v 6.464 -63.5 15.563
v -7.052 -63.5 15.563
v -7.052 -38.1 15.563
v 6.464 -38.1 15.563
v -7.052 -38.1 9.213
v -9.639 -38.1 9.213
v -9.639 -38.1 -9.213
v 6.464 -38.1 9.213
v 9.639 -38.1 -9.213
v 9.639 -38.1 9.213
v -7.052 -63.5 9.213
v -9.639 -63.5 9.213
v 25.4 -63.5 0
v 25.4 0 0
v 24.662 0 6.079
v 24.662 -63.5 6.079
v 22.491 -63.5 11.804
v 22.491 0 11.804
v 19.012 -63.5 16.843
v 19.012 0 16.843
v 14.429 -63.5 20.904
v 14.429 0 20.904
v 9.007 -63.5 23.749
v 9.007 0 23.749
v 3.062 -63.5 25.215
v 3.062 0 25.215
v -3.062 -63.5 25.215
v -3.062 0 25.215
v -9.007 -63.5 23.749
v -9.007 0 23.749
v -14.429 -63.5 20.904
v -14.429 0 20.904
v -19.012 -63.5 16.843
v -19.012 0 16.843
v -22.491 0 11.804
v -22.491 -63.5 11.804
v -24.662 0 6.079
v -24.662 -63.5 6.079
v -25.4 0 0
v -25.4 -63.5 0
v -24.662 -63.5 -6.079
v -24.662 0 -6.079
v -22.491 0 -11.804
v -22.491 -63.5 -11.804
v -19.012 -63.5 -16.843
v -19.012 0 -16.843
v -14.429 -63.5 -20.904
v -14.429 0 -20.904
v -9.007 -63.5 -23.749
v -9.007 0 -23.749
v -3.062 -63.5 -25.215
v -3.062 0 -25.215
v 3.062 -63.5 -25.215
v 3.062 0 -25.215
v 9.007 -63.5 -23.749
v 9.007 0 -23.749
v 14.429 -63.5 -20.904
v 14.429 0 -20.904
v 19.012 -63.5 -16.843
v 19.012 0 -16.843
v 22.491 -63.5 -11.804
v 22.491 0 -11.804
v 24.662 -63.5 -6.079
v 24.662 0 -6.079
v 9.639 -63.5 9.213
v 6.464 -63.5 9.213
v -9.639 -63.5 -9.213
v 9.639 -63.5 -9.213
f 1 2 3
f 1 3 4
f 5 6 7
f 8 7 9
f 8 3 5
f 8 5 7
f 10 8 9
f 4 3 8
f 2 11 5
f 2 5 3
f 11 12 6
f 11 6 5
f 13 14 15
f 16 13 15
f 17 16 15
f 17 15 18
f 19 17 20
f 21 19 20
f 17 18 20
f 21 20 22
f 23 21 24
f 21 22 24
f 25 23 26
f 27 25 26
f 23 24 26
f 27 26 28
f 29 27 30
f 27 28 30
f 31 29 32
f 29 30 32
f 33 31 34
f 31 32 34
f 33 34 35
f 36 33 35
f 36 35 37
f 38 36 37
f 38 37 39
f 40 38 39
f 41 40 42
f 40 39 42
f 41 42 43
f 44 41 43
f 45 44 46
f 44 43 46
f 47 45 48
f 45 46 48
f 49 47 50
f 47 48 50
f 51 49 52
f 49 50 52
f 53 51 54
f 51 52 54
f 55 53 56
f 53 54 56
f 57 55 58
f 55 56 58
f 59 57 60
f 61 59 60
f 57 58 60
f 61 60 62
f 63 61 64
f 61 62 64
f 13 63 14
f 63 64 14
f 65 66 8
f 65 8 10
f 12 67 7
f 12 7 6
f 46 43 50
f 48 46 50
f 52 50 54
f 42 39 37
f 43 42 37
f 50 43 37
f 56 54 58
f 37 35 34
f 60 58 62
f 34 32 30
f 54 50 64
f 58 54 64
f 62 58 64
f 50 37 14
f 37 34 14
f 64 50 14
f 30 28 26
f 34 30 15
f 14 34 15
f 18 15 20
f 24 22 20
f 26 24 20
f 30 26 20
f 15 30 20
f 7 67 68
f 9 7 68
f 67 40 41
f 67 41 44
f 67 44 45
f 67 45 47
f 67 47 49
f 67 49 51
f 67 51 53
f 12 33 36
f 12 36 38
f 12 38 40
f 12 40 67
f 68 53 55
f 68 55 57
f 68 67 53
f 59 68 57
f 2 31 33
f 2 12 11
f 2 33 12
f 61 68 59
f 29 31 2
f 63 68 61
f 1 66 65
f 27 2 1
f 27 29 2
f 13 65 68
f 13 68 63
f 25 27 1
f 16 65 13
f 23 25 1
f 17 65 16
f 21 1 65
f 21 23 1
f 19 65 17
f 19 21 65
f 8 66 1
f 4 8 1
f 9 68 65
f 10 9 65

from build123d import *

# Parameters (mm, degrees)
F0_R     = 25.4
F1_DEPTH = 63.5
F2_W     = 19.278284
F2_H     = 18.425608
F3_DEPTH = 25.4
F4_W     = 13.516292
F4_H     = 9.261201
F5_DEPTH = 25.4


with BuildPart() as f1:
    # F0 (on Front) → F1 (new body)
    with BuildSketch(Plane.XZ):
        Circle(F0_R)
    extrude(amount=F1_DEPTH)

    # F2 (on face) → F3 (cut)
    with BuildSketch(Plane.XZ.offset(63.5)):
        Rectangle(F2_W, F2_H)
    extrude(amount=-F3_DEPTH, mode=Mode.SUBTRACT)

    # F4 (on face) → F5 (cut)
    with BuildSketch(Plane.XZ.offset(63.5)):
        with Locations((-0.294004, 10.932203)):
            Rectangle(F4_W, F4_H)
    extrude(amount=-F5_DEPTH, mode=Mode.SUBTRACT)


solid = f1.part
